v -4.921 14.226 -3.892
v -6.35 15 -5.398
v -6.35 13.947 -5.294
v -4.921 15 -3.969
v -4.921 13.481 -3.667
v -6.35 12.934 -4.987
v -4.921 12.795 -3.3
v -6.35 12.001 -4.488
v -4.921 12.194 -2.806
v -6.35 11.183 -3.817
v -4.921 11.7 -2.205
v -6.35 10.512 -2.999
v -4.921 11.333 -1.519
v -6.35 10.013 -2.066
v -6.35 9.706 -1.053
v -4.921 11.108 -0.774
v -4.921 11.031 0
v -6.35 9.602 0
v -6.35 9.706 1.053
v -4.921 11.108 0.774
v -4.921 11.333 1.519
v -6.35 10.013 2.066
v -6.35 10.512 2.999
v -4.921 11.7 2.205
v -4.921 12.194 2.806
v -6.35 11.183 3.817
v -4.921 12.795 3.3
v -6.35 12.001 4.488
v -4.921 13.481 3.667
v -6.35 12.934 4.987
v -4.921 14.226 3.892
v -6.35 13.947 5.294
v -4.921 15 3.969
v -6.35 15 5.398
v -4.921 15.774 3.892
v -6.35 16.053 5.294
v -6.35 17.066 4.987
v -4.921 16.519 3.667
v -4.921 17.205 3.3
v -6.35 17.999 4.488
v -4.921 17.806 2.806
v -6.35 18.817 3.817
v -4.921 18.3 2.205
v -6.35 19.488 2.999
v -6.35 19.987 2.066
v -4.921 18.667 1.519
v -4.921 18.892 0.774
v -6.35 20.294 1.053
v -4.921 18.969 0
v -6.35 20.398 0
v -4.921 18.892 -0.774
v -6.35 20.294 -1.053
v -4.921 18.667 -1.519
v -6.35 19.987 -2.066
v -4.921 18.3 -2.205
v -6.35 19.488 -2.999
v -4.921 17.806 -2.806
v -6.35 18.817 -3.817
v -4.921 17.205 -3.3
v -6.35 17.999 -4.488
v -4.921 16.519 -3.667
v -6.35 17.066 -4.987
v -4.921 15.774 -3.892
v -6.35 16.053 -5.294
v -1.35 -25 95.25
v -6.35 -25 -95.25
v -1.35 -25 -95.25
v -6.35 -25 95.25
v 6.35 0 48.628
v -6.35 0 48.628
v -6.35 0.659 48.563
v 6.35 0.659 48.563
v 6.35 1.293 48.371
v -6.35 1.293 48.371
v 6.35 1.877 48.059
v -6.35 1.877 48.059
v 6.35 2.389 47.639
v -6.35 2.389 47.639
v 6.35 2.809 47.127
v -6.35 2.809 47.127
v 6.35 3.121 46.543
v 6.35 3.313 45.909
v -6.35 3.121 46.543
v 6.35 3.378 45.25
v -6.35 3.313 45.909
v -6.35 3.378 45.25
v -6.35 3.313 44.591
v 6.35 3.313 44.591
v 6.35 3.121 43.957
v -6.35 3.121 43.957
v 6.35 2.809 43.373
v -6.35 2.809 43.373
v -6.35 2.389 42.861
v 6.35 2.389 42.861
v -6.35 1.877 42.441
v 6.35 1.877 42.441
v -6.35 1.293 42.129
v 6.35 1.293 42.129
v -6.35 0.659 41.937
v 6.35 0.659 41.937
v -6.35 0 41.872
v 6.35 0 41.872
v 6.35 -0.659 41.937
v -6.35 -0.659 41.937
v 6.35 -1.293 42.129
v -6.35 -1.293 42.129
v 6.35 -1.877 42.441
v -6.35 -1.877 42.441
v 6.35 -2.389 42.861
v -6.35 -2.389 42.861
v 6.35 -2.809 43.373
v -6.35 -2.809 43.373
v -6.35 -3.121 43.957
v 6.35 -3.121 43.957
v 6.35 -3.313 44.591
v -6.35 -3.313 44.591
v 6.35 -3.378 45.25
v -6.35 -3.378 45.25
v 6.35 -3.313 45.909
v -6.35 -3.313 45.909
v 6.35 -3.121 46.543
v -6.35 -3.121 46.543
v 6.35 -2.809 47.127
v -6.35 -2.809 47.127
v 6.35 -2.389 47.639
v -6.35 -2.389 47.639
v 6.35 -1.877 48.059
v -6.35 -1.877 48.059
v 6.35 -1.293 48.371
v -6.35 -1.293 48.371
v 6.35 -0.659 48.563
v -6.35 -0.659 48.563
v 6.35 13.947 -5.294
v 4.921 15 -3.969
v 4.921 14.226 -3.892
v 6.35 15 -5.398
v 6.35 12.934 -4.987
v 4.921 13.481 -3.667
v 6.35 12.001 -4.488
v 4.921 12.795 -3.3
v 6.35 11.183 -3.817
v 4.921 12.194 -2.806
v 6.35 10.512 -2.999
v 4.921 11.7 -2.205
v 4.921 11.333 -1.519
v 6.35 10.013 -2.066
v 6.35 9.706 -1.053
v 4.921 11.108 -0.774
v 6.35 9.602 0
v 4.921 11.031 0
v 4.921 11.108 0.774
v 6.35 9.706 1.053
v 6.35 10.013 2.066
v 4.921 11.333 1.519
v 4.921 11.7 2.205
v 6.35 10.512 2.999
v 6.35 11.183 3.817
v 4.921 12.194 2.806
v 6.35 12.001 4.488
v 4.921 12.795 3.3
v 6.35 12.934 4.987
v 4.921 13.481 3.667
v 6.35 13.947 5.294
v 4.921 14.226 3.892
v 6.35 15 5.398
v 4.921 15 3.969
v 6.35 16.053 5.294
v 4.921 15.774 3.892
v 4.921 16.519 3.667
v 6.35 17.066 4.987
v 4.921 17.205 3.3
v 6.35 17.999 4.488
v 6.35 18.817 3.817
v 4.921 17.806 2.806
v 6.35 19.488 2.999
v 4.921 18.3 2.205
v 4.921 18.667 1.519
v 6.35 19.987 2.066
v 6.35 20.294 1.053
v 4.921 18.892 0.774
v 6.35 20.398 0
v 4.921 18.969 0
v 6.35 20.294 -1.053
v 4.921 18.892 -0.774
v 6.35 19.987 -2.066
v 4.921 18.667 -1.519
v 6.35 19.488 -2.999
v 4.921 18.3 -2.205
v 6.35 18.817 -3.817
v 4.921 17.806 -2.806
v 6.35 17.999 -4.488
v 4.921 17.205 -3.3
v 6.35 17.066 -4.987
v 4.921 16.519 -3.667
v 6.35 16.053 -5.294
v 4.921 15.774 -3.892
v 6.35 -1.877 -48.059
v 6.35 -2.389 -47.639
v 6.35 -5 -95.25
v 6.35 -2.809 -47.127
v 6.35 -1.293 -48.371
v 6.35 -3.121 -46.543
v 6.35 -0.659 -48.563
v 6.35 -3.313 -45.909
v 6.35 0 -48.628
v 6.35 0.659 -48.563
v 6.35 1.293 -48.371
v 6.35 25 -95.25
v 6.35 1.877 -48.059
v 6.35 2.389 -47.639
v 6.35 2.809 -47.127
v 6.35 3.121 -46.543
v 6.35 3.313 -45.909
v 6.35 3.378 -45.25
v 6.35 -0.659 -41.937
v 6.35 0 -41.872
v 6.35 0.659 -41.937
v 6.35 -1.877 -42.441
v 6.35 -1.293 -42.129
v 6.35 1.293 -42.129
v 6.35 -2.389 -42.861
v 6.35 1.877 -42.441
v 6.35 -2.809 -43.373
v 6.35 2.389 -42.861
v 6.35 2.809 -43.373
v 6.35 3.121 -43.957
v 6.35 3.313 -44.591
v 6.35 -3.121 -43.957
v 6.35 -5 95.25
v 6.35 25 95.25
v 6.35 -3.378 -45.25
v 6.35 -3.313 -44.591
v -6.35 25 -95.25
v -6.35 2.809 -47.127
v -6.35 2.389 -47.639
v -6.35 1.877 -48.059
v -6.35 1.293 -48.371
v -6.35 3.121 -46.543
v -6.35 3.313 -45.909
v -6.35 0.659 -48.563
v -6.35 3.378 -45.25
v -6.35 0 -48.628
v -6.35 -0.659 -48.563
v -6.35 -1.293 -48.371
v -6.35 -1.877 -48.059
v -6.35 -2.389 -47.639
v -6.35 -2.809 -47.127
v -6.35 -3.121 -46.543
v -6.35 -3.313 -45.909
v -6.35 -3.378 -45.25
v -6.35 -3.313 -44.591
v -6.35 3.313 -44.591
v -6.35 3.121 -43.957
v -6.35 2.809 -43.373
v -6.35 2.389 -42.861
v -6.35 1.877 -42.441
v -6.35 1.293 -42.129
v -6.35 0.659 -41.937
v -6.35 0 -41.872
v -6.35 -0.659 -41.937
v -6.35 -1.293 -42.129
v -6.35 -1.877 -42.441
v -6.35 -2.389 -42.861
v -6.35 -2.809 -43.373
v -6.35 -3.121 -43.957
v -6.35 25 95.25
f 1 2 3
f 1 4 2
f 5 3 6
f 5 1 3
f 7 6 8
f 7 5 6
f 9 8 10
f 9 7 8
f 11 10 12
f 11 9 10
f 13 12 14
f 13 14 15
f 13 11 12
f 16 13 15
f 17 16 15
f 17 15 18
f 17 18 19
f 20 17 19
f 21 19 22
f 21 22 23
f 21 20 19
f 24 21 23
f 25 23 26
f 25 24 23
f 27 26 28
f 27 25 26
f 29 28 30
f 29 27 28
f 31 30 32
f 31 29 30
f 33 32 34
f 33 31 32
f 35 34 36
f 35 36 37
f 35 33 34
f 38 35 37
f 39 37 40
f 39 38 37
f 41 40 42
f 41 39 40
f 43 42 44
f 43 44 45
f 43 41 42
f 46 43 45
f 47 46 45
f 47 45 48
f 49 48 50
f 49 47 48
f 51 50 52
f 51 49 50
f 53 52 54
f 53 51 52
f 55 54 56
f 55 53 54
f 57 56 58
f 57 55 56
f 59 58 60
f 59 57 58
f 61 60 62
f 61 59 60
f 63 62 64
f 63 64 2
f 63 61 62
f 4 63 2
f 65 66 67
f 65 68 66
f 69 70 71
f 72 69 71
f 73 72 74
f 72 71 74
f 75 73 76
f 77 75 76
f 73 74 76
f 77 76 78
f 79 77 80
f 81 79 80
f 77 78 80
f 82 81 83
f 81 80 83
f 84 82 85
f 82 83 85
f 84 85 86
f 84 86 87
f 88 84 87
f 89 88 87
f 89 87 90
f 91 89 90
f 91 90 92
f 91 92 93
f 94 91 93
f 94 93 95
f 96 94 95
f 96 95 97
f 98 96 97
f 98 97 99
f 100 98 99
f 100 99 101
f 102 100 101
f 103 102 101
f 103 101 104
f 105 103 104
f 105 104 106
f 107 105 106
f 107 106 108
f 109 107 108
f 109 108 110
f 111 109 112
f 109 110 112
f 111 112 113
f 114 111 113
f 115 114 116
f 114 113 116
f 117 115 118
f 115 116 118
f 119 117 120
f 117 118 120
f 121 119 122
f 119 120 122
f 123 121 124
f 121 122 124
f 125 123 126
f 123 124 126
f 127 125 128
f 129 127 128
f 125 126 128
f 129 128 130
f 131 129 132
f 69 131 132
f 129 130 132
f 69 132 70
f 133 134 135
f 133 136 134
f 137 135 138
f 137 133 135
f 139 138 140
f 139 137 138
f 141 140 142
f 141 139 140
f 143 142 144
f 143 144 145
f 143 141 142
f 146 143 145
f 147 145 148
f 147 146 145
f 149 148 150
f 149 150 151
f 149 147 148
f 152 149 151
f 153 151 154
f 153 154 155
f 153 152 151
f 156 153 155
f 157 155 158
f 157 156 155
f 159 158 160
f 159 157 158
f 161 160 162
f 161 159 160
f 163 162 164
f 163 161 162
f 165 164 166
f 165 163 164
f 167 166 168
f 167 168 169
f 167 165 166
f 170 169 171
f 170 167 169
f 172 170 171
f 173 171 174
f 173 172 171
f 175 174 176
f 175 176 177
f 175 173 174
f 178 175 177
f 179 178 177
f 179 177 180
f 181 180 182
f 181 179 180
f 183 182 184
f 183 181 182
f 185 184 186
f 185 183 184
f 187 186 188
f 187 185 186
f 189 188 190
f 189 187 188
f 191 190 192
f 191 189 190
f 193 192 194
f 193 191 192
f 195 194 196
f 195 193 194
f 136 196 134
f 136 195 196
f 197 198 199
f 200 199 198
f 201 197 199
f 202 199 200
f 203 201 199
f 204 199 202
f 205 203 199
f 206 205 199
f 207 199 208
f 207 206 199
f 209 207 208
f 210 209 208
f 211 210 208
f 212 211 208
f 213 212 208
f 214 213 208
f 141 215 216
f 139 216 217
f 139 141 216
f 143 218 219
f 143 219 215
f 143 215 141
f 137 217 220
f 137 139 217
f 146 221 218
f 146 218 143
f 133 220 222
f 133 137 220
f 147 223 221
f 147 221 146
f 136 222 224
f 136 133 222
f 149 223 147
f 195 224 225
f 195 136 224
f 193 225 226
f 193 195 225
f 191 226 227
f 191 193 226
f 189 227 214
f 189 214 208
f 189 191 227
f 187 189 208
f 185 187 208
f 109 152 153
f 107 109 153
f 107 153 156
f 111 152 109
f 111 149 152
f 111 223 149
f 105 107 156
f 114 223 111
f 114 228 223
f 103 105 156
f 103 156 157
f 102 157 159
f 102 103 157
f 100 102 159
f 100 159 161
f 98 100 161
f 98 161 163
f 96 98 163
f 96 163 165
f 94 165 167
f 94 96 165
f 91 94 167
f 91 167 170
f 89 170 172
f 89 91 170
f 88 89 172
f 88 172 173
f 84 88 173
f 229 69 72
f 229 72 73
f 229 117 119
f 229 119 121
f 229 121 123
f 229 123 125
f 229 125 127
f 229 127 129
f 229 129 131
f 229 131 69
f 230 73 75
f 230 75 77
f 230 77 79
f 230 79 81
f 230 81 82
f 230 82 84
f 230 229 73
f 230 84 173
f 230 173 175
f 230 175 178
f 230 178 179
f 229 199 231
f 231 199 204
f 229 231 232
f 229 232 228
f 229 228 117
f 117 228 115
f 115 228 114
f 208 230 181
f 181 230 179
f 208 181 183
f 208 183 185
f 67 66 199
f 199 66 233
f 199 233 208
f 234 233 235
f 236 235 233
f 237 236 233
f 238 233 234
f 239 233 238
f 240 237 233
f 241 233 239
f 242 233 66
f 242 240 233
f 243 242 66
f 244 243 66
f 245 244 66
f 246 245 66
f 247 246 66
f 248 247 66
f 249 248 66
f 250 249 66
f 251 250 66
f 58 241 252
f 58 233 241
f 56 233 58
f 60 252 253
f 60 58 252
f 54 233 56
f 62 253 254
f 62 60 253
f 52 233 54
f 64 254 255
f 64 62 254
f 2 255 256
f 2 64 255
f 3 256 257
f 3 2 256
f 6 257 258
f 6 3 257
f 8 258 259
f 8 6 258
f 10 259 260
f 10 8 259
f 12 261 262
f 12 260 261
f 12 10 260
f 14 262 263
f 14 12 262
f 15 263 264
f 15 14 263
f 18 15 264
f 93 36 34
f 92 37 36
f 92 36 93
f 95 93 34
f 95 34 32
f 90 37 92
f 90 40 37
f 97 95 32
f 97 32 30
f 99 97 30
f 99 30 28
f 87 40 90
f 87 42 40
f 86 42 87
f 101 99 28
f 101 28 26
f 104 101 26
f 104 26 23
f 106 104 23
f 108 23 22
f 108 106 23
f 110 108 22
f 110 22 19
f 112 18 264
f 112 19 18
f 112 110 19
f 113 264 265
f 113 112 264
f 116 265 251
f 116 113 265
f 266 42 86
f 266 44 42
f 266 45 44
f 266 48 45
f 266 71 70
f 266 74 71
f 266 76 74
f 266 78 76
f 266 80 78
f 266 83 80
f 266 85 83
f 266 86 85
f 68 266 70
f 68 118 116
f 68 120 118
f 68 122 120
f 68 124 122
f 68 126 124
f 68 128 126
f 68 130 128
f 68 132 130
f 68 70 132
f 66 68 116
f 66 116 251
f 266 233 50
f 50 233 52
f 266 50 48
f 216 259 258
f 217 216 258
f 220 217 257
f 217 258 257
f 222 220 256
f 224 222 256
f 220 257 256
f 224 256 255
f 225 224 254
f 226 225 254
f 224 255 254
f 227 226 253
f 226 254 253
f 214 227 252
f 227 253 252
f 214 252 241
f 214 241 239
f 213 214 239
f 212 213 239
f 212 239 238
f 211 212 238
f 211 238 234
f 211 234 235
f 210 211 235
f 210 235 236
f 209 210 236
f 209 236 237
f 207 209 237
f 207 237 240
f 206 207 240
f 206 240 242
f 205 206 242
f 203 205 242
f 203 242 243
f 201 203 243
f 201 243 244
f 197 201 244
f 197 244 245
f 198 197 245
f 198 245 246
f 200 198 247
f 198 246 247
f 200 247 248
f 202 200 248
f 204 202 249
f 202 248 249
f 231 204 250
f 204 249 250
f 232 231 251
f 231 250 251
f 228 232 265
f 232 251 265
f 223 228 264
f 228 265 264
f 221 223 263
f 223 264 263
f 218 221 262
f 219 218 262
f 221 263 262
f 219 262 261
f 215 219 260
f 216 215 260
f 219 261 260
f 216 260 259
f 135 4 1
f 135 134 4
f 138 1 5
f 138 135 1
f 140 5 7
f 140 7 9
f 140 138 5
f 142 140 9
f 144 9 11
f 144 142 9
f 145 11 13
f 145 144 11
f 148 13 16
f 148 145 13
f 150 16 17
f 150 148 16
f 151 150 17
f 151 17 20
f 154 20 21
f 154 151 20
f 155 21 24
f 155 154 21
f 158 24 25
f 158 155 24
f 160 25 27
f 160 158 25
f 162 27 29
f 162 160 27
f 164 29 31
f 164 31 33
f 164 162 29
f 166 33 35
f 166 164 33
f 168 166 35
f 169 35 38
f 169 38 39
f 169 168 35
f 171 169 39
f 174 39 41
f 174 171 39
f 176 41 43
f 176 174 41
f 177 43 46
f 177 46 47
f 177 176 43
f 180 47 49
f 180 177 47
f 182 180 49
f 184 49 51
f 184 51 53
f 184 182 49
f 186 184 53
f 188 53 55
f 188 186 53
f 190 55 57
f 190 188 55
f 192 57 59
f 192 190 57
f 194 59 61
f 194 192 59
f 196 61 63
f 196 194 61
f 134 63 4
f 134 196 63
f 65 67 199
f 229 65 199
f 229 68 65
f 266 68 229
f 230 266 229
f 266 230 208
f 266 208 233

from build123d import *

# Parameters (mm, degrees)
SALIENTE_EXTRUIR1_DEPTH       = 95.25
TALADRO_DE_MARGEN_PARA_1_41_D = 6.7564


with BuildPart() as part:
    # Croquis1 → Saliente-Extruir1 (new, symmetric)
    with BuildSketch(Plane.XY):
        Polygon((-1.35, -25), (6.35, -5), (6.35, 25), (-6.35, 25), (-6.35, -25), align=None)
    extrude(amount=SALIENTE_EXTRUIR1_DEPTH, both=True)

    # Taladro de margen para 1/41 (through all)
    with Locations(Plane(origin=(6.35, 0, 0), x_dir=(0, 0, -1), z_dir=(1, 0, 0))):
        with Locations((-45.25, 0), (45.25, 0)):
            Hole(TALADRO_DE_MARGEN_PARA_1_41_D / 2)

    # Croquis7 → Taladro roscado 3/8-161 (revolve, cut)
    with BuildSketch(Plane(origin=(6.35, 15, 0), x_dir=(0, 0, -1), z_dir=(0, 1, 0))):
        Polygon((0, 0), (0, 12.7), (5.3975, 12.7), (3.96875, 11.27125), (3.96875, 1.42875), (5.3975, 0), align=None)
    revolve(axis=Axis((12.7, 15, 0), (-1, 0, 0)), mode=Mode.SUBTRACT)


solid = part.part
